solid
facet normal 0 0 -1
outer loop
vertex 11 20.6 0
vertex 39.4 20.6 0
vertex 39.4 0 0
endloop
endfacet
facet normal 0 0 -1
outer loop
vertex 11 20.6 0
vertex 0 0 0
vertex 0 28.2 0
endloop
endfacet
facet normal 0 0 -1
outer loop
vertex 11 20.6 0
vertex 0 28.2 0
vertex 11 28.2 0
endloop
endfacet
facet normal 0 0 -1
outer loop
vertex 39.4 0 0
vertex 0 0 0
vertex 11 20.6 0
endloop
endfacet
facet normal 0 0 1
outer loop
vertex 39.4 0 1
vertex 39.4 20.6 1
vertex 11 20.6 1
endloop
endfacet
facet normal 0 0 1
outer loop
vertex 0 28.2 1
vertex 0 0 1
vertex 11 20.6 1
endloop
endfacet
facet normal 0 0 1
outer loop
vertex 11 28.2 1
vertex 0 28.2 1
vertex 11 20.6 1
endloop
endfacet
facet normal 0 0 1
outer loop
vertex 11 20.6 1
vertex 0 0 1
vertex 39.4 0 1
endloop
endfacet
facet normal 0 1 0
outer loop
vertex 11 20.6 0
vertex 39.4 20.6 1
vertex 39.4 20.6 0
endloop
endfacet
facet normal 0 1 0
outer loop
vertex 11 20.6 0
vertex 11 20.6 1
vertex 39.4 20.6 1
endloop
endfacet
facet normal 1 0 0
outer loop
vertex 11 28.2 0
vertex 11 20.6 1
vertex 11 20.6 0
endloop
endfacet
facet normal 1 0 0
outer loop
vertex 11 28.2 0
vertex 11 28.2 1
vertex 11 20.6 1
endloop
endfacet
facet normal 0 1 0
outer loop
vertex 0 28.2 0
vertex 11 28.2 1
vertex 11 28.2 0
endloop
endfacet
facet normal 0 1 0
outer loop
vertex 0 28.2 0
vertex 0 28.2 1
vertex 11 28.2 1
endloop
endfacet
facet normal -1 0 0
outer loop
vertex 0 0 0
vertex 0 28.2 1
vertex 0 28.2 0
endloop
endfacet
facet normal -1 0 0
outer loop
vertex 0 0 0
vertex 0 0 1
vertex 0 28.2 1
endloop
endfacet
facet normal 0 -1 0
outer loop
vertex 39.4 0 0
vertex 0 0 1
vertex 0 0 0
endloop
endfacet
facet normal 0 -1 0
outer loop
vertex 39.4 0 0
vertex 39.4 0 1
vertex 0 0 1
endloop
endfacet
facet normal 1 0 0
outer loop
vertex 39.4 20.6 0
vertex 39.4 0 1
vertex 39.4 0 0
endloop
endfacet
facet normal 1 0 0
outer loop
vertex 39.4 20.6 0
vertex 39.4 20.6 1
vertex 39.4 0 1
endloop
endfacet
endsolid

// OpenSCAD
r = 0.02; // ratio


module room() {
    w = 3350; // 11'
    d = 2590; // 8'6"

    difference() {
        linear_extrude(2) square([w*r+2, d*r+2], center=true);
        translate([0,0,1]) linear_extrude(1) square([w*r, d*r], center=true);
    }
}

module bed() {
    w = 1970;
    d = 1030;
    d_ladder = 1410;
    w_ladder = 550;
    
    linear_extrude(1) union() {
        square([w*r, d*r]);
        translate([0,0]) square([w_ladder*r, d_ladder*r]);
    }
}

module desk() {
    w = 1600;
    d = 800;
    
    linear_extrude(1) square([w*r, d*r], center=true);
}

module grid_shelf() {
    w = 770;
    d = 390;
    h = 1470;
    
    linear_extrude(d*r) difference() {
        square([h*r, w*r], center=true);
        square([h*r-2, w*r-2], center=true);
    }
}

module shelf() {
    w = 800;
    d = 280;
    
    linear_extrude(1) square([w*r, d*r], center=true);
}

//room();
bed();
//desk();
//grid_shelf();
//shelf();
